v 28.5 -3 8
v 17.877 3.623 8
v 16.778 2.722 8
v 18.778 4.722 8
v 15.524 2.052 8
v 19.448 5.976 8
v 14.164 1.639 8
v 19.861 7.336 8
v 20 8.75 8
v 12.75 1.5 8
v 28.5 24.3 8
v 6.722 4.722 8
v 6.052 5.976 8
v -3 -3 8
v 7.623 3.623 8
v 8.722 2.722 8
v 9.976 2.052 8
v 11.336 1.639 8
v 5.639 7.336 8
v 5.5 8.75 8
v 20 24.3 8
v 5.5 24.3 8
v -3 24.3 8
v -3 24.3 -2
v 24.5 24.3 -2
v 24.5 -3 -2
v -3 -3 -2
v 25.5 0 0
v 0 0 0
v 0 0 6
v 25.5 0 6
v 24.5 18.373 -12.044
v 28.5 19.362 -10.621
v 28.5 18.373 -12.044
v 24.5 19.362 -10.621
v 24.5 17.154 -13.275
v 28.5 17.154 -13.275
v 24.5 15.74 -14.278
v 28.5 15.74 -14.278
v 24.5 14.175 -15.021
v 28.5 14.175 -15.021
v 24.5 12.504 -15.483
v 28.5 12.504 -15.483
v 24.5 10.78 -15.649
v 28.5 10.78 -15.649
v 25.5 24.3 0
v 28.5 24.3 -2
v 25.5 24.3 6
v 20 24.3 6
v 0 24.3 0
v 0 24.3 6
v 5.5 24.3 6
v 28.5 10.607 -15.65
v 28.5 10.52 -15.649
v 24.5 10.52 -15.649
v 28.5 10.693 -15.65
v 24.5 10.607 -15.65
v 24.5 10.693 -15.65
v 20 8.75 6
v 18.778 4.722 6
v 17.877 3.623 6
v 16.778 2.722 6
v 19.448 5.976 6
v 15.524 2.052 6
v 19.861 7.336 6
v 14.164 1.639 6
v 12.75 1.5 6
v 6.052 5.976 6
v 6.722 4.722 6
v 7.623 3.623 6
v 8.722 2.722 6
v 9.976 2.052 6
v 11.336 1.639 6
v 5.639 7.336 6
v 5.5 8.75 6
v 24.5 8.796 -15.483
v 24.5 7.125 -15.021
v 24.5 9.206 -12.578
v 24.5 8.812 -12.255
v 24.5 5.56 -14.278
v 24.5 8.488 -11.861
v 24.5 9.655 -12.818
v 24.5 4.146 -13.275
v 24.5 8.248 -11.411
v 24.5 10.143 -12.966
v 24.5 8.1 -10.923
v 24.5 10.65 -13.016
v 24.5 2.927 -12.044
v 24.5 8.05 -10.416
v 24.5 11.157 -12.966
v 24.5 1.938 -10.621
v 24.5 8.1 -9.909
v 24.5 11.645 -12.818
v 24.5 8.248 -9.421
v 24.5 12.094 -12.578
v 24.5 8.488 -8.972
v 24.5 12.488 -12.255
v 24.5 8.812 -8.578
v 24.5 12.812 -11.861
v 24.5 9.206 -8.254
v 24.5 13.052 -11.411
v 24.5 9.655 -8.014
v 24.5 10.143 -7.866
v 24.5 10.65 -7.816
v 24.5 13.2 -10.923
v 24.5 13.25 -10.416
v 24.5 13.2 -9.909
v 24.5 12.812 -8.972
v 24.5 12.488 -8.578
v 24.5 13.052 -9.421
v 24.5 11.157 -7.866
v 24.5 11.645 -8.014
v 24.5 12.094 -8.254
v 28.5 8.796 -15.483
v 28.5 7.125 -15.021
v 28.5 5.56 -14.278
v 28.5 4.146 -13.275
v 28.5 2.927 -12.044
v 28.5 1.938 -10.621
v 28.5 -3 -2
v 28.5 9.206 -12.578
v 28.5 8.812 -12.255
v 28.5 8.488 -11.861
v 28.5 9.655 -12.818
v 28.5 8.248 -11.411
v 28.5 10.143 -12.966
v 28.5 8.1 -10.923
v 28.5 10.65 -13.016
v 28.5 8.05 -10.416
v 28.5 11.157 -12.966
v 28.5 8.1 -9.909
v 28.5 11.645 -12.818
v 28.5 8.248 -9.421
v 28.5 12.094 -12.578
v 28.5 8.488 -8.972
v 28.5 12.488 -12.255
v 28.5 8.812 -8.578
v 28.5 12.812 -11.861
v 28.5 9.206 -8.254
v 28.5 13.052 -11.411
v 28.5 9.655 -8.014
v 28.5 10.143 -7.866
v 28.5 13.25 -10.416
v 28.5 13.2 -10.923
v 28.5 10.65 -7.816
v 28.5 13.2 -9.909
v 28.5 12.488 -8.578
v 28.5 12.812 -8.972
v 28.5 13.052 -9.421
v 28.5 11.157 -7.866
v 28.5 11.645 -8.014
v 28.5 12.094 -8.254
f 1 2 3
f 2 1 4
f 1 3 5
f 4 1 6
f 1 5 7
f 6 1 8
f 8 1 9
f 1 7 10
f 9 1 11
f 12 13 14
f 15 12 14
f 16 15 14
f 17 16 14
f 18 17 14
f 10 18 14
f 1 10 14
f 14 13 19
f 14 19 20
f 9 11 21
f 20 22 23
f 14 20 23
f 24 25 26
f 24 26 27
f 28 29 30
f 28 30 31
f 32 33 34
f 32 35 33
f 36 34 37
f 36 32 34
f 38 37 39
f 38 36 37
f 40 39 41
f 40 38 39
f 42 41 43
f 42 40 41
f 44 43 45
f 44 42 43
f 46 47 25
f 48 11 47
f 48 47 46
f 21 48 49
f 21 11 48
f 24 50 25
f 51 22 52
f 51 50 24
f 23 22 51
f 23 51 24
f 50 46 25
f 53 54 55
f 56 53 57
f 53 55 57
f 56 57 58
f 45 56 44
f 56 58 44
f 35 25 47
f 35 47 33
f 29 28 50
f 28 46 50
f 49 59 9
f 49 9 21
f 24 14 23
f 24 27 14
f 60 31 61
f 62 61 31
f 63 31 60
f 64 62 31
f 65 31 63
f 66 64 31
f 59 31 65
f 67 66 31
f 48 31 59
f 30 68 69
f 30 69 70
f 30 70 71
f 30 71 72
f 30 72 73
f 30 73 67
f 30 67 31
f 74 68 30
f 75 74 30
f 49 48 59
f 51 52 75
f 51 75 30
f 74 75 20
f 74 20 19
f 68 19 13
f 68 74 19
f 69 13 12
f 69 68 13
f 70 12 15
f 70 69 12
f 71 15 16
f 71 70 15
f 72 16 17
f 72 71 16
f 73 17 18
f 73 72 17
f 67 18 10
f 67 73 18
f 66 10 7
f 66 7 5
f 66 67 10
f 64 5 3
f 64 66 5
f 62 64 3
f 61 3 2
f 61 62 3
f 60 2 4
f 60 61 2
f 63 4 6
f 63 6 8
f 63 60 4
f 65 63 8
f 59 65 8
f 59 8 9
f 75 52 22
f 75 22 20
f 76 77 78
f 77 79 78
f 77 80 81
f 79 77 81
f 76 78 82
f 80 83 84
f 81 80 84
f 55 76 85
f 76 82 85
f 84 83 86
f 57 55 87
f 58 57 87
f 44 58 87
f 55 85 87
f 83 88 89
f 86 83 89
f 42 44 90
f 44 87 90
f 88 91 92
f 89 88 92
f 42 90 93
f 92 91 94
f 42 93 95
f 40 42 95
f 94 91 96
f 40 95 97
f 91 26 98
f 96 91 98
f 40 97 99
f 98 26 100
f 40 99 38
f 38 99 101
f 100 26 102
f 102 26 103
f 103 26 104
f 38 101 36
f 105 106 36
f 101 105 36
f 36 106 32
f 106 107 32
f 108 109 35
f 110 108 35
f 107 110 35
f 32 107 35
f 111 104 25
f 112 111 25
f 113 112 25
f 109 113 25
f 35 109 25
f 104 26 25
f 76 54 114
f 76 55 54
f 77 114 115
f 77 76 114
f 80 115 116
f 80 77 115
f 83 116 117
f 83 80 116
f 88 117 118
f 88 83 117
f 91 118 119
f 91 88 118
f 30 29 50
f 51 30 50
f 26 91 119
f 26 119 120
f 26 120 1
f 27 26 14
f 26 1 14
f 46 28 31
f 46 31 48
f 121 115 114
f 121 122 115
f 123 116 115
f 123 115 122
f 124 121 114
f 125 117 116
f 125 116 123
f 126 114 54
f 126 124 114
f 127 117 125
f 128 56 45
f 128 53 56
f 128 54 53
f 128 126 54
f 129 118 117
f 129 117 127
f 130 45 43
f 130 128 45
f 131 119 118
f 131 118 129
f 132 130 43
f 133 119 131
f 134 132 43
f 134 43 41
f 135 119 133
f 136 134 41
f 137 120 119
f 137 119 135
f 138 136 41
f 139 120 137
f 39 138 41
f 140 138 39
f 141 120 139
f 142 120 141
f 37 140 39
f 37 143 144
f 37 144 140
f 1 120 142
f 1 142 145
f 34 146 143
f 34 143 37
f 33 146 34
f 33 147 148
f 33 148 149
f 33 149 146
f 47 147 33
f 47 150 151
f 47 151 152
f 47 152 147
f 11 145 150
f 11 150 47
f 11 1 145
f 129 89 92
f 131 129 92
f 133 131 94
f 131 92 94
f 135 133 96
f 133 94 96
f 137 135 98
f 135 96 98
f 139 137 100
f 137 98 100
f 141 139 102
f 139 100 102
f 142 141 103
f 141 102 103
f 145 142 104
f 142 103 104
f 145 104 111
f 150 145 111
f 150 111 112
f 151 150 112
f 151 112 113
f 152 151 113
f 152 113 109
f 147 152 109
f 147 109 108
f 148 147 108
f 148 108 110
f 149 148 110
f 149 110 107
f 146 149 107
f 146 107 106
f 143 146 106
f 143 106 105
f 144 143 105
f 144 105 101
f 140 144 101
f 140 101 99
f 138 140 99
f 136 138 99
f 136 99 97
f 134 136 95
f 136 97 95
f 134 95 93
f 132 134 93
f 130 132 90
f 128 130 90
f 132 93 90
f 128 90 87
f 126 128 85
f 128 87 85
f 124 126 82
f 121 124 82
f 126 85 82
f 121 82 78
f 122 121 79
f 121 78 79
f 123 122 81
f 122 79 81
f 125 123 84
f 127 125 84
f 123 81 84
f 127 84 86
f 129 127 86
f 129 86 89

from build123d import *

# Parameters (mm, degrees)
SKETCH1_W           = 31.5
SKETCH1_H           = 30.3
SKETCH1_W_2         = 25.5
SKETCH1_H_2         = 24.3
BOSS_EXTRUDE1_DEPTH = 6
SKETCH2_W           = 31.5
SKETCH2_H           = 30.3
BOSS_EXTRUDE2_DEPTH = 2
CUT_EXTRUDE1_DEPTH  = 61
BOSS_EXTRUDE3_DEPTH = 2
SKETCH5_W           = 4
SKETCH5_H           = 27.3
BOSS_EXTRUDE4_DEPTH = 38
CUT_EXTRUDE2_DEPTH  = 38
SKETCH7_R           = 2.6
CUT_EXTRUDE3_DEPTH  = 38
CUT_EXTRUDE4_DEPTH  = 38
FILLET1_R           = 10


with BuildPart() as part:
    # Sketch1 → Boss-Extrude1 (new body)
    with BuildSketch(Plane.XY):
        with Locations((12.75, 12.15)):
            Rectangle(SKETCH1_W, SKETCH1_H)
        with Locations((12.75, 12.15)):
            Rectangle(SKETCH1_W_2, SKETCH1_H_2, mode=Mode.SUBTRACT)
    extrude(amount=BOSS_EXTRUDE1_DEPTH)

    # Sketch2 → Boss-Extrude2 (add)
    with BuildSketch(Plane(origin=(0, 0, 0), x_dir=(-1, 0, 0), z_dir=(0, 0, -1))):
        with Locations((-12.75, 12.15)):
            Rectangle(SKETCH2_W, SKETCH2_H)
    extrude(amount=BOSS_EXTRUDE2_DEPTH)

    # Sketch3 → Cut-Extrude1 (cut)
    with BuildSketch(Plane.XY.offset(6)):
        Polygon((-3, 24.391972576), (-3, 27.3), (28.5, 27.3), (28.5, 24.391972576), (28.5, 24.3), (0, 24.3), (-3, 24.3), align=None)
    extrude(amount=-CUT_EXTRUDE1_DEPTH, mode=Mode.SUBTRACT)

    # Sketch4 → Boss-Extrude3 (add)
    with BuildSketch(Plane.XY.offset(6)):
        with BuildLine():
            Line((-3, 24.3), (5.5, 24.3))
            Line((5.5, 24.3), (5.5, 8.75))
            ThreePointArc((5.5, 8.75), (12.75, 1.5), (20, 8.75))
            Line((20, 8.75), (20, 24.3))
            Line((20, 24.3), (28.5, 24.3))
            Line((28.5, 24.3), (28.5, -3))
            Line((28.5, -3), (-3, -3))
            Line((-3, -3), (-3, 24.3))
        make_face()
    extrude(amount=BOSS_EXTRUDE3_DEPTH)

    # Sketch5 → Boss-Extrude4 (add)
    with BuildSketch(Plane(origin=(0, 0, -2), x_dir=(-1, 0, 0), z_dir=(0, 0, -1))):
        with Locations((-26.5, 10.65)):
            Rectangle(SKETCH5_W, SKETCH5_H)
    extrude(amount=BOSS_EXTRUDE4_DEPTH)

    # Sketch6 → Cut-Extrude2 (cut)
    with BuildSketch(Plane.ZY.offset(-24.5)):
        with BuildLine():
            Line((-2, -3), (-40, -3))
            Line((-40, -3), (-40, 24.3))
            Line((-40, 24.3), (-2, 24.3))
            Line((-2, 24.3), (-17.826401454, 15.23386068))
            ThreePointArc((-17.826401454, 15.23386068), (-18.562622883, 14.501365189), (-18.832265792, 13.498437306))
            Line((-18.832265792, 13.498437306), (-18.832265792, 7.801562694))
            ThreePointArc((-18.832265792, 7.801562694), (-18.562622883, 6.798634811), (-17.826401454, 6.06613932))
            Line((-17.826401454, 6.06613932), (-2, -3))
        make_face()
    extrude(amount=-CUT_EXTRUDE2_DEPTH, mode=Mode.SUBTRACT)

    # Sketch7 → Cut-Extrude3 (cut)
    with BuildSketch(Plane.ZY.offset(-24.5)):
        with Locations(Location((-10.416132896, 10.65, 0), (0, 0, 270))):
            Circle(SKETCH7_R)
    extrude(amount=-CUT_EXTRUDE3_DEPTH, mode=Mode.SUBTRACT)

    # Sketch8 → Cut-Extrude4 (cut)
    with BuildSketch(Plane.ZY.offset(-24.5)):
        with BuildLine():
            ThreePointArc((-11.252656387, 0.614520451), (-15.36913817, 13.404749459), (-6.531723112, 23.52579068))
            Line((-6.531723112, 23.52579068), (-21.13731595, 18.385251799))
            Line((-21.13731595, 18.385251799), (-20.671768388, 0.766067146))
            Line((-20.671768388, 0.766067146), (-11.252656387, 0.614520451))
        make_face()
    extrude(amount=-CUT_EXTRUDE4_DEPTH, mode=Mode.SUBTRACT)

    # Fillet1
    fillet1_edges = [part.edges().sort_by_distance(p)[0] for p in [
        (26.5, 3.7451865, -13.774805753),
        (26.5, 17.5548135, -13.774805753),
    ]]
    fillet(fillet1_edges, radius=FILLET1_R)


solid = part.part
